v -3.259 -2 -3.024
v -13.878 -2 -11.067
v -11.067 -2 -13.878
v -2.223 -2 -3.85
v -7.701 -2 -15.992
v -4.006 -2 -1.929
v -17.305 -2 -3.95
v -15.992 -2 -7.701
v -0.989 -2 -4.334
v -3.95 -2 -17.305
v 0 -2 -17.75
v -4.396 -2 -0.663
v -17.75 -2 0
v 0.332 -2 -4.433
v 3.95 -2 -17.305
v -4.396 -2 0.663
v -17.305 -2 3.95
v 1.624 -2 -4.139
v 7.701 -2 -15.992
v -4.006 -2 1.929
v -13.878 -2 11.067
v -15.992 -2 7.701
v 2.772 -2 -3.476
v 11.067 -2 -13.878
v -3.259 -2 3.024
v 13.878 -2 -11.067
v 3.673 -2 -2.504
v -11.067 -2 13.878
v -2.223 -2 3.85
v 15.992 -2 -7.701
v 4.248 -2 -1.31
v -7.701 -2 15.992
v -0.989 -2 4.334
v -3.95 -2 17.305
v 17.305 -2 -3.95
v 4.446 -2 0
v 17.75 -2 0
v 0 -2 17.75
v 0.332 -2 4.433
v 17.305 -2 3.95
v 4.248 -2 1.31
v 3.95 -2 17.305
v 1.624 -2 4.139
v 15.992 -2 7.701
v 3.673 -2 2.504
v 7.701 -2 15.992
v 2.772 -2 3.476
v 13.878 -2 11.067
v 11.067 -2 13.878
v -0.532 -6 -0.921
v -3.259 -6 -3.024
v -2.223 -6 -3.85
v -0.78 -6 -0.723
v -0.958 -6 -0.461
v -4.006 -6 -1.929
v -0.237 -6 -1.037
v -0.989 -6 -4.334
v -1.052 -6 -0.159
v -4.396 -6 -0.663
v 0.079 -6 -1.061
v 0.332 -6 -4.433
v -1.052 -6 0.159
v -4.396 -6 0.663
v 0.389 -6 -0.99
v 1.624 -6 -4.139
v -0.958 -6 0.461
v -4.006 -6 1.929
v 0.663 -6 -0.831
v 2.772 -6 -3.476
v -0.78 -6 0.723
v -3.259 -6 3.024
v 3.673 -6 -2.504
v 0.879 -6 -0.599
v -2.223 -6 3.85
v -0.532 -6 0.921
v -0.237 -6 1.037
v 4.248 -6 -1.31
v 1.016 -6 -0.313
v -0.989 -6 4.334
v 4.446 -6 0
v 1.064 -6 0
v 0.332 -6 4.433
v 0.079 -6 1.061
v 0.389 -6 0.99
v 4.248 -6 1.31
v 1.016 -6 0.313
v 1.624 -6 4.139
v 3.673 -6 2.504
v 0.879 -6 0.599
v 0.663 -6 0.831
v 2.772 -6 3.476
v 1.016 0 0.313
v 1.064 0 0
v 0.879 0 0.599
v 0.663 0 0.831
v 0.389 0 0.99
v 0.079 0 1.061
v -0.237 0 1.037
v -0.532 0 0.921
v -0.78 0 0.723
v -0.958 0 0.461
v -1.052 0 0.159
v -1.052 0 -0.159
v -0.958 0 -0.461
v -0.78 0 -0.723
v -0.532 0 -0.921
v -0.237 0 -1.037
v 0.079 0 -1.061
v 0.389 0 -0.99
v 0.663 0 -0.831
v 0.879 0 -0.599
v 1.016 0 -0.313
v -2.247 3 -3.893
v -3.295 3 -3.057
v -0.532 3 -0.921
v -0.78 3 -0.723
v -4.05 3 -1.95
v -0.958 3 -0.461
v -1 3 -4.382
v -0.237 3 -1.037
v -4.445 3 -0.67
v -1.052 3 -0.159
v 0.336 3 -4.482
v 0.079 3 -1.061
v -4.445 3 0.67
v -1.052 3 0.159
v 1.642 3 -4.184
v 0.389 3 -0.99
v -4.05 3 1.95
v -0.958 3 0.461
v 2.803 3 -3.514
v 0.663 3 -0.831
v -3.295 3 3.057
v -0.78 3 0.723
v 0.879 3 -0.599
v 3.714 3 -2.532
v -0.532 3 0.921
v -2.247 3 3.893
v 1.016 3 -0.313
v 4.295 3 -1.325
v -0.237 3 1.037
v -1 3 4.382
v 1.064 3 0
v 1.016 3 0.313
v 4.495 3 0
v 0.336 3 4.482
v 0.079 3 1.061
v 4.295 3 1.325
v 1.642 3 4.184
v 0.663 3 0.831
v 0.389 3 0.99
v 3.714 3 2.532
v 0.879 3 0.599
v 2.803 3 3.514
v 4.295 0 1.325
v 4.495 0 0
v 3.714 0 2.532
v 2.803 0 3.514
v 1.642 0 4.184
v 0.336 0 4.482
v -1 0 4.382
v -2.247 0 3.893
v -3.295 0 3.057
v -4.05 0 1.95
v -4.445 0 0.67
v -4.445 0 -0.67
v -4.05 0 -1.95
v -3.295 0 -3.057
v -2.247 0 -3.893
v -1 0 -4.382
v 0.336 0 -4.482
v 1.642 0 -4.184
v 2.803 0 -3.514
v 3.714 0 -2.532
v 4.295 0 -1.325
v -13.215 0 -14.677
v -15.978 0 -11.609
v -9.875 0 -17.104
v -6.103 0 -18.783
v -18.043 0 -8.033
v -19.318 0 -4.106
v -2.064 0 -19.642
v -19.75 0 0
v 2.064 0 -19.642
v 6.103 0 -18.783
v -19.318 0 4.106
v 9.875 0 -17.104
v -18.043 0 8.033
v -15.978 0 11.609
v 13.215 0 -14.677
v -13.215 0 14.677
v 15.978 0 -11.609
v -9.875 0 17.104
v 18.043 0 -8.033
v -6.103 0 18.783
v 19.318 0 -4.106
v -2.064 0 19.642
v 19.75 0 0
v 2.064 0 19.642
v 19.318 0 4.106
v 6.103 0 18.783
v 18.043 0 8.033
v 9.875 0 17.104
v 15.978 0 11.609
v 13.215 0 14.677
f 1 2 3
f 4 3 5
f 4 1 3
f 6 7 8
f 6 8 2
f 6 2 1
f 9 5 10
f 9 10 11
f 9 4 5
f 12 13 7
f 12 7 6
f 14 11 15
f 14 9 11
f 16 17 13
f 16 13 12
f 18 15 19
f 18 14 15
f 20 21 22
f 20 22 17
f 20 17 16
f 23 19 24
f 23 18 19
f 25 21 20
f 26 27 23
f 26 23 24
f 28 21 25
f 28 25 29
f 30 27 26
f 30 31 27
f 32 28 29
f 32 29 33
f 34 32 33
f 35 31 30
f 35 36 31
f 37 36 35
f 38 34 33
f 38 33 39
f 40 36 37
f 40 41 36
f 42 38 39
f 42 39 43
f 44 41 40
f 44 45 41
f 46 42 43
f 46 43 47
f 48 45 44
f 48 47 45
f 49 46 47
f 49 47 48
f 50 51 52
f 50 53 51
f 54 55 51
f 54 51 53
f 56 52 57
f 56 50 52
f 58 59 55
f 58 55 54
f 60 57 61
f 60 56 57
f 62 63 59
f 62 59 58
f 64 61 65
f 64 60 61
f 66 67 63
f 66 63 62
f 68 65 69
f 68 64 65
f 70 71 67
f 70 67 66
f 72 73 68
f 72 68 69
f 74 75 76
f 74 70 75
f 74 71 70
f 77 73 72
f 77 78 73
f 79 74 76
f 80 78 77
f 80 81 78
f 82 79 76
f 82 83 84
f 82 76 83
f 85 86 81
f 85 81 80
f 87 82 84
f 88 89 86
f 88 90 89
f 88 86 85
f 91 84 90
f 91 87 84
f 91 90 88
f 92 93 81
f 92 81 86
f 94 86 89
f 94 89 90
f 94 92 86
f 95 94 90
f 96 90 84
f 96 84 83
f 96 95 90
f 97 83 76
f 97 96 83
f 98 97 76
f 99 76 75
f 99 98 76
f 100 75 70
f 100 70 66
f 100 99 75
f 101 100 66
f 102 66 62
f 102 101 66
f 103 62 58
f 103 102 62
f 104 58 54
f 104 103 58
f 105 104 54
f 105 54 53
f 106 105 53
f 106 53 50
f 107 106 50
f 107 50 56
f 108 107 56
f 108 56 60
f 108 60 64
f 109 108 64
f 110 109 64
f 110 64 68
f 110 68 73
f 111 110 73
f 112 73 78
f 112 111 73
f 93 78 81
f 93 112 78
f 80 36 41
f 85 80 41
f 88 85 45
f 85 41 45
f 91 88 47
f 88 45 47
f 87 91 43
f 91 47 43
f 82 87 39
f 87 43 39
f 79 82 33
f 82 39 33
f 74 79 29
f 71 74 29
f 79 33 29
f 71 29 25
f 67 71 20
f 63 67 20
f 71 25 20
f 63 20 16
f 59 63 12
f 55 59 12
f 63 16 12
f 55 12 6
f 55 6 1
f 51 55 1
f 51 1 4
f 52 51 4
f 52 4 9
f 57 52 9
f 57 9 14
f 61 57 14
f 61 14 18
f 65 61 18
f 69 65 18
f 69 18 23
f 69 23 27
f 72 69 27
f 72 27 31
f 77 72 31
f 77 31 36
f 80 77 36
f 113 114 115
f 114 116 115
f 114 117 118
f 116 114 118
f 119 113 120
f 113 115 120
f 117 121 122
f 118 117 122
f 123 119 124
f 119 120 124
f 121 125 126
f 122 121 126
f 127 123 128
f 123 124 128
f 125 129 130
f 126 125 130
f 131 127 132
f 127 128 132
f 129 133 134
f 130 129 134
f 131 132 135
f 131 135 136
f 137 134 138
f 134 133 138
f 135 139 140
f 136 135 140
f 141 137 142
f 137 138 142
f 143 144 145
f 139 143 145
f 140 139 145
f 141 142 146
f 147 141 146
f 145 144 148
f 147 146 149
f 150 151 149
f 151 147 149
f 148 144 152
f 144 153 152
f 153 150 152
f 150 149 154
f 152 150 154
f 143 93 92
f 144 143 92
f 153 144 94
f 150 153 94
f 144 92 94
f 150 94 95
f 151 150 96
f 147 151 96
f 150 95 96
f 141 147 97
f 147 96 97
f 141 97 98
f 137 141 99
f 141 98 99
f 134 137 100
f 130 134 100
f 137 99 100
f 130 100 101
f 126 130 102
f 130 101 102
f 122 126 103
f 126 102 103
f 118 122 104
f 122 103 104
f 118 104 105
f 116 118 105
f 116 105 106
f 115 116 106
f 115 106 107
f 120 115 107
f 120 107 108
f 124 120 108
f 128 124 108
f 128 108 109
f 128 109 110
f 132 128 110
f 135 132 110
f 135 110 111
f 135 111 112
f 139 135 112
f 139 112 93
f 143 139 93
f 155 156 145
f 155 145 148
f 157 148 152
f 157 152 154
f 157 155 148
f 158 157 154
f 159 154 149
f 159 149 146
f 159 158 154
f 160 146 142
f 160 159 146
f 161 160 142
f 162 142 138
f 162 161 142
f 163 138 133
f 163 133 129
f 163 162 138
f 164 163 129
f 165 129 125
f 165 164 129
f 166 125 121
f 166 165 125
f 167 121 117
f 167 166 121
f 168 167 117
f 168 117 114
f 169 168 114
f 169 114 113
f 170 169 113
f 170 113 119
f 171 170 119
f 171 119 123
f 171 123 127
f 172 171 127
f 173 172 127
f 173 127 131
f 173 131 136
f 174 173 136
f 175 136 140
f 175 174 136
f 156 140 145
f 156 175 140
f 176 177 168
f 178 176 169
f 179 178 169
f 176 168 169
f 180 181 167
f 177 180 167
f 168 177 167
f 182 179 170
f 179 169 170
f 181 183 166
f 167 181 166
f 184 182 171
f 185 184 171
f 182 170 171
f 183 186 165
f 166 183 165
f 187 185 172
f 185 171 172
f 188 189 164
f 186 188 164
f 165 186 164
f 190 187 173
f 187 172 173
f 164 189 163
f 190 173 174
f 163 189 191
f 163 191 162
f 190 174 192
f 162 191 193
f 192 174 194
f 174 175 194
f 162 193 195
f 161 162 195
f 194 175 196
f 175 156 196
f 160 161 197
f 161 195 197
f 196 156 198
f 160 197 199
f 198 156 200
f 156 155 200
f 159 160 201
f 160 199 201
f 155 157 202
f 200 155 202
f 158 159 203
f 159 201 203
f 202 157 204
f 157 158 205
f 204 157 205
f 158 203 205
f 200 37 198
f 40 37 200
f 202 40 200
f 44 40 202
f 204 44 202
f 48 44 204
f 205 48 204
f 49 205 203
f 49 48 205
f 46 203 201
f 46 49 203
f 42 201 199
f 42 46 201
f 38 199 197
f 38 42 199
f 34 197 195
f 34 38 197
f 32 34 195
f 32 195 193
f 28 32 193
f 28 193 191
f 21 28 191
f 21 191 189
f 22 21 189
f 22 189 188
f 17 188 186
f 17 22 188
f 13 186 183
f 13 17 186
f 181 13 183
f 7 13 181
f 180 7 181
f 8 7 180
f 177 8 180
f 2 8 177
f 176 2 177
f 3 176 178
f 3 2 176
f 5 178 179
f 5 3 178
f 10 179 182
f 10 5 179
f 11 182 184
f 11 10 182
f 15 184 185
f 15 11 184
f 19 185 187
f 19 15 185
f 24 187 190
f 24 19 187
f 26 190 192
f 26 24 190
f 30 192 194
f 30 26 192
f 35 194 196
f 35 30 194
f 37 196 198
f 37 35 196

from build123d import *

# Parameters (mm, degrees)
F0_R     = 22.75
F1_DEPTH = 2
F2_R     = 4.4458772924
F3_DEPTH = 6
F4_R     = 4.4949655375
F5_DEPTH = 3
F6_R     = 1.0635
F7_DEPTH = 6
F8_R     = 1.0635
F9_DEPTH = 6


# Not quite as in the source:
# - a fillet or chamfer that OpenCascade refuses, or shapes differently, is made with other operations: its cross-section is extruded or revolved along the edge and cut away or added


with BuildPart() as f1:
    # F0 (on Front) → F1 (new body)
    with BuildSketch(Plane.XZ):
        Circle(F0_R)
    extrude(amount=F1_DEPTH)

    # F2 (on Front) → F3 (join)
    with BuildSketch(Plane.XZ):
        Circle(F2_R)
    extrude(amount=F3_DEPTH)

    # F4 (on Front) → F5 (join)
    with BuildSketch(Plane.XZ):
        Circle(F4_R)
    extrude(amount=-F5_DEPTH)

    # F6 (on Front) → F7 (cut)
    with BuildSketch(Plane.XZ):
        Circle(F6_R)
    extrude(amount=F7_DEPTH, mode=Mode.SUBTRACT)

    # F8 (on Front) → F9 (cut)
    with BuildSketch(Plane.XZ):
        Circle(F8_R)
    extrude(amount=-F9_DEPTH, mode=Mode.SUBTRACT)

    # F10: chamfer of 5 on 1 edges, made by hand

    # F10_s1 → F10_t2 (revolve, cut)
    with BuildSketch(Plane.XY):
        Polygon((22.75, 3), (17.75, -2), (22.75, -2), align=None)
    revolve(axis=Axis((0, -2, 0), (0, -1, 0)), mode=Mode.SUBTRACT)


solid = f1.part
